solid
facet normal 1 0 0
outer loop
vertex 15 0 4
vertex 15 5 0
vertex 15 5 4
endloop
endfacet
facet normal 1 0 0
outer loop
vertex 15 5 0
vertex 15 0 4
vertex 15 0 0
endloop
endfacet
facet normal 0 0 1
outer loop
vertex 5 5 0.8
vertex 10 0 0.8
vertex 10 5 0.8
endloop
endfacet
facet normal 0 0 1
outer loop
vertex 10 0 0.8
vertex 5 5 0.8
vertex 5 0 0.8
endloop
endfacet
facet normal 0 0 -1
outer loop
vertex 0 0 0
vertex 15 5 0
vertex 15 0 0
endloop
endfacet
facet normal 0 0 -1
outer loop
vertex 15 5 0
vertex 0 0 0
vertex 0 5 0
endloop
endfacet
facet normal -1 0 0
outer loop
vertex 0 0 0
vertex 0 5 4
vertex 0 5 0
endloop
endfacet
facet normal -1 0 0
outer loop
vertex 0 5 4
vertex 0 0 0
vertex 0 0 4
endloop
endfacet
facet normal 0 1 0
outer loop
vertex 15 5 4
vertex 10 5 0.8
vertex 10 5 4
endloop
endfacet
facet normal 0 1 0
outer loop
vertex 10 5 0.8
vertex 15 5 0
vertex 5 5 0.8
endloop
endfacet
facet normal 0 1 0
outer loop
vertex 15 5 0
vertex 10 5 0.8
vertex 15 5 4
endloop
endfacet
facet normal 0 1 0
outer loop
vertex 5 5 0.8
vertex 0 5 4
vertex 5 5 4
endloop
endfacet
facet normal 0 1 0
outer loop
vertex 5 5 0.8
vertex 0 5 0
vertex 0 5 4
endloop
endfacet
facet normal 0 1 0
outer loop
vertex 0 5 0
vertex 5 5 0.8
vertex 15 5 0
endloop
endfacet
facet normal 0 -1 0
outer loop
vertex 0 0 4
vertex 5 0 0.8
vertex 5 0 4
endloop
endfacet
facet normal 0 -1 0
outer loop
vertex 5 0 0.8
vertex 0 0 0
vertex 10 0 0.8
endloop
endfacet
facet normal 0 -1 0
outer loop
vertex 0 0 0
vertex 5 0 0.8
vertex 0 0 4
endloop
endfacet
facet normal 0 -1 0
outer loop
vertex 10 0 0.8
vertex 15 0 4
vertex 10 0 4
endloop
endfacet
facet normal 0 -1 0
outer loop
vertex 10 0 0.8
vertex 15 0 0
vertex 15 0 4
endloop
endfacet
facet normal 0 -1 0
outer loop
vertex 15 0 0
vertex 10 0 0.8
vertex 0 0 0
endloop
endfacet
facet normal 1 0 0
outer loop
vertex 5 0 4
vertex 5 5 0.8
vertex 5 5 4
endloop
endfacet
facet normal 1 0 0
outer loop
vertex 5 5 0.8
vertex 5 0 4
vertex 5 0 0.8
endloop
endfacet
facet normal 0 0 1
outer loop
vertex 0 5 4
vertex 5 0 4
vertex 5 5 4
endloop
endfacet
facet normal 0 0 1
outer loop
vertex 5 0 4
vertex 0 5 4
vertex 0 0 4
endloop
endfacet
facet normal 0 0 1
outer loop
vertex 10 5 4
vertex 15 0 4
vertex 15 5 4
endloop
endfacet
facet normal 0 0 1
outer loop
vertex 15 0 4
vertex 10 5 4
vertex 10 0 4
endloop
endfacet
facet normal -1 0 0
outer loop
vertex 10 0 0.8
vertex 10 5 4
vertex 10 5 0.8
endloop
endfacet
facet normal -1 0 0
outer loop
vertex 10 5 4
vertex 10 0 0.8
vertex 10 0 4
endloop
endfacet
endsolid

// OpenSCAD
cube([15,5,0.8]);
cube([5,5,0.2*20]);
translate([10, 0, 0]) cube([5, 5, 0.2*20]);
